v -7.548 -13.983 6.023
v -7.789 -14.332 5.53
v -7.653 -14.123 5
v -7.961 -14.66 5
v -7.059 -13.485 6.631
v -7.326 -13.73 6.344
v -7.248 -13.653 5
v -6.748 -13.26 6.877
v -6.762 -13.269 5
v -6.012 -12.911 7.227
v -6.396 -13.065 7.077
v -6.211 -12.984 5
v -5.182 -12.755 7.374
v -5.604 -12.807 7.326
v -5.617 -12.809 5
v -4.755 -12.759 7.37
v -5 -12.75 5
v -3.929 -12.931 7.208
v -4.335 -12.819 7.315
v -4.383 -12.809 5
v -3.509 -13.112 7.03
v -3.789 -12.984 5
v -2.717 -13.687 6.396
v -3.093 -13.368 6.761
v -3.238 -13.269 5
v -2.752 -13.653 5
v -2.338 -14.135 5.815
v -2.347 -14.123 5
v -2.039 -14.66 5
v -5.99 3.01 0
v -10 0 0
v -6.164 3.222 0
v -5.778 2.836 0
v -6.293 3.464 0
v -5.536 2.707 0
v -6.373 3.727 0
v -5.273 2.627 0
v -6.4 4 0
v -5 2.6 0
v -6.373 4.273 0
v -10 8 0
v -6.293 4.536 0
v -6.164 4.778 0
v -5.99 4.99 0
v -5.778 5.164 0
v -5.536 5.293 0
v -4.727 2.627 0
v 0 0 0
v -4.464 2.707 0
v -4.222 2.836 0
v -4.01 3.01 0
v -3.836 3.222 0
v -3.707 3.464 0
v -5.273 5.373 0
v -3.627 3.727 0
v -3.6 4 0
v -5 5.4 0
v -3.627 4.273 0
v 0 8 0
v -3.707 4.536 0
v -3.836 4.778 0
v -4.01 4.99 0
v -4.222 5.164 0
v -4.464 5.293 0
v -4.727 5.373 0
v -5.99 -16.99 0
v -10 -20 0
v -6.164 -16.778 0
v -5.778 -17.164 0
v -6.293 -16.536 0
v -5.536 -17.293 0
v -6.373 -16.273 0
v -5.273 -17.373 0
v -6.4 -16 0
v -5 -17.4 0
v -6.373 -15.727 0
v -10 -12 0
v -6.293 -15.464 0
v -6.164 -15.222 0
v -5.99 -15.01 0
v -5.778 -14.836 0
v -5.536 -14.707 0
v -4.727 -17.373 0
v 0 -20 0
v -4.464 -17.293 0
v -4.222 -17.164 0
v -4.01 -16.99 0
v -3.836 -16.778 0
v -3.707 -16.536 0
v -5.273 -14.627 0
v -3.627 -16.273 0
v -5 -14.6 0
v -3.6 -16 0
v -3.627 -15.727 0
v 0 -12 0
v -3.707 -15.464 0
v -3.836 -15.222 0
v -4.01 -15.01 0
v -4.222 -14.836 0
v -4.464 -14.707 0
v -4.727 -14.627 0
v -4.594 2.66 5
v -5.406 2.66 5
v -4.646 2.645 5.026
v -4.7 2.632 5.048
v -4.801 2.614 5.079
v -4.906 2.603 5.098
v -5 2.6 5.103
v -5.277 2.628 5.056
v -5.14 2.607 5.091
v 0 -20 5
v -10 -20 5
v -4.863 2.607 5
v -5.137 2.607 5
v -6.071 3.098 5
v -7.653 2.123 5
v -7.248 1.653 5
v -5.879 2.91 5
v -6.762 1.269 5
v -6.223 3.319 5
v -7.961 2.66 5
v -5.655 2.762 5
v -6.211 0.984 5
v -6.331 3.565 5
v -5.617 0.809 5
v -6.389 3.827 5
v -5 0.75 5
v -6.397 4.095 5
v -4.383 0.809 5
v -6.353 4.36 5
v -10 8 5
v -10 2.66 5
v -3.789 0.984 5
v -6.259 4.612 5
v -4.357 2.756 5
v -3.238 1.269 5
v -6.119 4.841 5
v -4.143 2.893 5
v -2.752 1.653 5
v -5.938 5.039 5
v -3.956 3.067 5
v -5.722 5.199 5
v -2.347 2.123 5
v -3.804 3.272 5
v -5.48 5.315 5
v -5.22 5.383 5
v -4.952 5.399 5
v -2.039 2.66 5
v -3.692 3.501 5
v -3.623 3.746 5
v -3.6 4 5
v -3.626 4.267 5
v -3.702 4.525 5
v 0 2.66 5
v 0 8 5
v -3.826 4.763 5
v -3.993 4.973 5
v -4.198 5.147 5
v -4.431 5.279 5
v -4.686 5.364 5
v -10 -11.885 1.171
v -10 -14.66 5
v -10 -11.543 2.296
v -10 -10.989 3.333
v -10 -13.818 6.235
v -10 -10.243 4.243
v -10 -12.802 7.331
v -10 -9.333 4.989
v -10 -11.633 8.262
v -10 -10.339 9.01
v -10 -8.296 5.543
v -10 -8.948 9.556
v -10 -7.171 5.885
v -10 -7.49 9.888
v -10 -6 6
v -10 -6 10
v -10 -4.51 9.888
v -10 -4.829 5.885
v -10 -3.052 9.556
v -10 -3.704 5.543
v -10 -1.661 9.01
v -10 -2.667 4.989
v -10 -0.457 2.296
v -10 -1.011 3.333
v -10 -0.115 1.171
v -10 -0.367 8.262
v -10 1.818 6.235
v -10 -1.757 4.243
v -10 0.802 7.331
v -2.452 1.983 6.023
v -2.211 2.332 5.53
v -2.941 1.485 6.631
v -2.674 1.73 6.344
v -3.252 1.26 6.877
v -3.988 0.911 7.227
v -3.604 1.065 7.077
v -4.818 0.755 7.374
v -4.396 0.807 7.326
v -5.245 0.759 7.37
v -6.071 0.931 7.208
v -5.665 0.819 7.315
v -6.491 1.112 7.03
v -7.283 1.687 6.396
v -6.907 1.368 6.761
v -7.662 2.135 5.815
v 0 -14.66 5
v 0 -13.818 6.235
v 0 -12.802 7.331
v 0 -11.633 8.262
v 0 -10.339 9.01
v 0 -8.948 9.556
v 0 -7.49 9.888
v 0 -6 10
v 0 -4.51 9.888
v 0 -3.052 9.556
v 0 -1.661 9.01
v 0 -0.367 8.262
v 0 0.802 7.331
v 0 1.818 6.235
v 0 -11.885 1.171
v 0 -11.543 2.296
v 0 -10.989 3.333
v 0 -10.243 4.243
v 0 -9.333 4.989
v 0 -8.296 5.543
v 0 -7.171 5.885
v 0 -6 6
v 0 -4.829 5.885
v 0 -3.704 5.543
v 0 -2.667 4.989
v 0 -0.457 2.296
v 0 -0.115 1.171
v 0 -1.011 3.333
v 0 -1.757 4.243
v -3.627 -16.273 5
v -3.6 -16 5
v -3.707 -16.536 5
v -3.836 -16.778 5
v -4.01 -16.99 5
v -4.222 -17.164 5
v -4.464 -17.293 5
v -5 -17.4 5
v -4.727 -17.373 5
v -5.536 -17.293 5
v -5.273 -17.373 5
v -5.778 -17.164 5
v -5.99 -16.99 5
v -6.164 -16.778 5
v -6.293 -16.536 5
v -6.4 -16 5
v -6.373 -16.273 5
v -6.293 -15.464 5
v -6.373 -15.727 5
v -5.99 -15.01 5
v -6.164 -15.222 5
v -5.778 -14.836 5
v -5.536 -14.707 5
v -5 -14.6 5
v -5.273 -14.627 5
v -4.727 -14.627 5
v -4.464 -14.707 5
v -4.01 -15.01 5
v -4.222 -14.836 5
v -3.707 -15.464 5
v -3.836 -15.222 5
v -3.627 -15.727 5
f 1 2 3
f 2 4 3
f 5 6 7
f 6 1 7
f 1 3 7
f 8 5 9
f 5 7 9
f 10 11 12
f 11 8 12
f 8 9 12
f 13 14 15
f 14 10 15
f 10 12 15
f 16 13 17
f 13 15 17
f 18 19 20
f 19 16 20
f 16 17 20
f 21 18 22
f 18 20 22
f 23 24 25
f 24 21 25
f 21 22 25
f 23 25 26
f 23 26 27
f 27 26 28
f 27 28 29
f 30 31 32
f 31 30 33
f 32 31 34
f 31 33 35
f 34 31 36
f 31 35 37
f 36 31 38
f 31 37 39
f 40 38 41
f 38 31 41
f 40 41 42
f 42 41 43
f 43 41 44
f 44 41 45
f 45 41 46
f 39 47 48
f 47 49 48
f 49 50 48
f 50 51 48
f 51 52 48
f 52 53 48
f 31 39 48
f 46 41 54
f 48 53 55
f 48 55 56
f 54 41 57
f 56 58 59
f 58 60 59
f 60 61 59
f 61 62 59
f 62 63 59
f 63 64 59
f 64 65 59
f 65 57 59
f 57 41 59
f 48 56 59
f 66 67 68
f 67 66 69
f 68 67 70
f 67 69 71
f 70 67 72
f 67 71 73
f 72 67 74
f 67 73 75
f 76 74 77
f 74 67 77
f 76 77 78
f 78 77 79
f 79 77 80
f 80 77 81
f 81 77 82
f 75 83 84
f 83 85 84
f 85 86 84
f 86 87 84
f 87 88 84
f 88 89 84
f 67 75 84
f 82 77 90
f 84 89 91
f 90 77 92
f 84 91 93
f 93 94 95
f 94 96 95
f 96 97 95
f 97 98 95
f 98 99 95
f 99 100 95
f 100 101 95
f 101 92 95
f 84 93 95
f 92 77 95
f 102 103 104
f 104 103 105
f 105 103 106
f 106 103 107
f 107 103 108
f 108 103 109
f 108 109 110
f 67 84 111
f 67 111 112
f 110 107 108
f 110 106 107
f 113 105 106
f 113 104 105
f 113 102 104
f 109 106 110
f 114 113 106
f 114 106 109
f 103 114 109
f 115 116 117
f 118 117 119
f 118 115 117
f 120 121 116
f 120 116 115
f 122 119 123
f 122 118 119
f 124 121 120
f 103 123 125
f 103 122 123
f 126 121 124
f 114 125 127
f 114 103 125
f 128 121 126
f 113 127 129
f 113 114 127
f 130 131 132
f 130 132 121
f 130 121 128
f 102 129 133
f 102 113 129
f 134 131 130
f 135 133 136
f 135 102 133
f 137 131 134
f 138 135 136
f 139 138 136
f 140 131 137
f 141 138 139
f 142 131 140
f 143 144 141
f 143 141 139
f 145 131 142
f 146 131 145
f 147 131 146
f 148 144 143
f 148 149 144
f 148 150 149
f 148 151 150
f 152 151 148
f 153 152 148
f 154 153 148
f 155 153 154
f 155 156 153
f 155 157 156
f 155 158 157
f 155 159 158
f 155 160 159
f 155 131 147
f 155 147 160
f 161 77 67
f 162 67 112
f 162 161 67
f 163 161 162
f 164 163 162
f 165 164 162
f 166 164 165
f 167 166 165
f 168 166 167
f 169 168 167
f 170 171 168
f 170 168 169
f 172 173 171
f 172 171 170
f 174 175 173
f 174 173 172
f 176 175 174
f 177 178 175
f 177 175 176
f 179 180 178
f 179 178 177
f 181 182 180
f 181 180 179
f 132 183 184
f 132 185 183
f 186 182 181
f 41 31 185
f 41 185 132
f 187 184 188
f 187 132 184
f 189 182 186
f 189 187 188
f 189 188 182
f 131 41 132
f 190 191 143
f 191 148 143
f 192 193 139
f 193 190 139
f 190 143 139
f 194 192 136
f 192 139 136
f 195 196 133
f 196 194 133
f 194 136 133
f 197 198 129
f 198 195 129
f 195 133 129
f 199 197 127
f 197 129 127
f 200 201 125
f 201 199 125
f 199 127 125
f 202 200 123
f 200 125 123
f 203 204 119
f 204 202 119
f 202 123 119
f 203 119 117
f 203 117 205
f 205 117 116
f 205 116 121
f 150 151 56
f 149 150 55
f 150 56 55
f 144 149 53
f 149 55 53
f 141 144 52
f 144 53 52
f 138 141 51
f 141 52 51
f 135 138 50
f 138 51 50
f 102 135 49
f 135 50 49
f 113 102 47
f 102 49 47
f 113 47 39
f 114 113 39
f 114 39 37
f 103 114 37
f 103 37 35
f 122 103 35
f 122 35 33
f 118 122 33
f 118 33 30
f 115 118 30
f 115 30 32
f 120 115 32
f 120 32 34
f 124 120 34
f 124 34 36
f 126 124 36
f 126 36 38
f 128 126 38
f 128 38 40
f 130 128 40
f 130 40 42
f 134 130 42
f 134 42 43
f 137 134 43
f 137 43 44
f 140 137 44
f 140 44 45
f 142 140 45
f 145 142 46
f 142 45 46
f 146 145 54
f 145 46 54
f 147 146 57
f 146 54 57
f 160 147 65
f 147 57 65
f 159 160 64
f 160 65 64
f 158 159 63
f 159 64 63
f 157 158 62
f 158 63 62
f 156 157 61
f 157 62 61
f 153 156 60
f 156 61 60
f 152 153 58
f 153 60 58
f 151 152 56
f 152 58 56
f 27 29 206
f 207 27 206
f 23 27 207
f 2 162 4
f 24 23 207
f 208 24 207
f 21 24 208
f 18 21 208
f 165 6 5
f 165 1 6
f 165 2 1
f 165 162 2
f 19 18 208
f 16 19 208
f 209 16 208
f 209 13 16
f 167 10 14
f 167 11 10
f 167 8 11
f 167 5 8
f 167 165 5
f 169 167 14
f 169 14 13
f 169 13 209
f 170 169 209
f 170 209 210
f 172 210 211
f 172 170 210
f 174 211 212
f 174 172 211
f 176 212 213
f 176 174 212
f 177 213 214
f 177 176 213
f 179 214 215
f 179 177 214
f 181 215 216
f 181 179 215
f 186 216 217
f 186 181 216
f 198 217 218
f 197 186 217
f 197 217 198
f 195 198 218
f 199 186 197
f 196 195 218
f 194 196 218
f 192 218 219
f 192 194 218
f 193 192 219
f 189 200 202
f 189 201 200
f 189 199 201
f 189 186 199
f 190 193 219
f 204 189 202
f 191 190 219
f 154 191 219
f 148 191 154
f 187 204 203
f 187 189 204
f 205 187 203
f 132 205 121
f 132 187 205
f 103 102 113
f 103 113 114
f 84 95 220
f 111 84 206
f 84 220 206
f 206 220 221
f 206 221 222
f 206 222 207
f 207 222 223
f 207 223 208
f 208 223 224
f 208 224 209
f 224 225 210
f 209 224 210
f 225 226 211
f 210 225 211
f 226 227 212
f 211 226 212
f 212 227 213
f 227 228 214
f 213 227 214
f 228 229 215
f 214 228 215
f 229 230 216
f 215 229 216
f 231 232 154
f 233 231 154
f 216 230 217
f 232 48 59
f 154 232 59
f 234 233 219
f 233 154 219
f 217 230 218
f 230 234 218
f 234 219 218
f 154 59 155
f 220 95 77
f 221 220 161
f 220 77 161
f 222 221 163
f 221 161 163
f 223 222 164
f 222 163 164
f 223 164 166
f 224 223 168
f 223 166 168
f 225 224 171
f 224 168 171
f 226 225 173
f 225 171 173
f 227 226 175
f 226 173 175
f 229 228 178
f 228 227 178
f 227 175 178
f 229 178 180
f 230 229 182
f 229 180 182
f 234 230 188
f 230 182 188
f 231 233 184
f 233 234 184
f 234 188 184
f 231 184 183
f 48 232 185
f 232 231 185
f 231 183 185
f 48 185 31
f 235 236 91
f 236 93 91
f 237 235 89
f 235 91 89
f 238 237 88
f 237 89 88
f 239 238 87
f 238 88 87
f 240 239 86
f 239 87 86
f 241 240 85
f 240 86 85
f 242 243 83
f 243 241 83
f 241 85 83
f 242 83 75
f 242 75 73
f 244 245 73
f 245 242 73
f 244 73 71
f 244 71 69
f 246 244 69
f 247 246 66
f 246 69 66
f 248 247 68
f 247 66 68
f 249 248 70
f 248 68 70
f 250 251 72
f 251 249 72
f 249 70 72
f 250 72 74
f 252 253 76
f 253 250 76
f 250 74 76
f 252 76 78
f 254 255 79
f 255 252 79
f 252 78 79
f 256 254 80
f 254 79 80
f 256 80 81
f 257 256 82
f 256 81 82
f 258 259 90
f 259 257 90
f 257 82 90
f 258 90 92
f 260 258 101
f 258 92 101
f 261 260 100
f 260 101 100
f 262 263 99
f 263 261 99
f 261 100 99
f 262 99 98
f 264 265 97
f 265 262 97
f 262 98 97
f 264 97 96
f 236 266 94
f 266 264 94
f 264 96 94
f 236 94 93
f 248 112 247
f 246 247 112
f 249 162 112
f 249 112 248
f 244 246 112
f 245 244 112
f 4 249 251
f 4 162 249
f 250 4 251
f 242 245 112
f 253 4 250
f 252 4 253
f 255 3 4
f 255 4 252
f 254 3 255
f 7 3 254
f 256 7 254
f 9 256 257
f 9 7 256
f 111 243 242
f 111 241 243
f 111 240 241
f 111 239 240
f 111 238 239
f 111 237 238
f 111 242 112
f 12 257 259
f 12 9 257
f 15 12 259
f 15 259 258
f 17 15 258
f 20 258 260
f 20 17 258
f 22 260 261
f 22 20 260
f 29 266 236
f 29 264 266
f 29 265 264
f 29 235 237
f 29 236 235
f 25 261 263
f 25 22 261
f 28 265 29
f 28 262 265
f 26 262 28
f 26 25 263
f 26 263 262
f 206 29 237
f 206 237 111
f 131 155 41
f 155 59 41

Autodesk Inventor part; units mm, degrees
ref_plane "YZ Plane" through (0, 0, 0) normal (1, 0, 0) x (0, 1, 0)
ref_plane "XZ Plane" through (0, 0, 0) normal (0, 1, 0) x (-1, 0, 0)
ref_plane "XY Plane" through (0, 0, 0) normal (0, 0, 1) x (1, 0, 0)
sketch "Sketch1" plane through (0, 0, 0) normal (0, 0, 1) x (1, 0, 0)
  circle A0 centre (-5, -16) radius 1.4 projected
  line L0 (0, -20) -> (0, -12) projected
  line L1 (0, -12) -> (-10, -12) projected
  line L2 (-10, -20) -> (-10, -12) projected
  line L3 (0, -20) -> (-10, -20) projected
  circle A1 centre (-5, 4) radius 1.4 projected
  line L4 (0, 0) -> (0, 8) projected
  line L5 (0, 8) -> (-10, 8) projected
  line L6 (-10, 0) -> (-10, 8) projected
  line L7 (0, 0) -> (-10, 0) projected
extrude "Extrusion1" add sketch "Sketch1" along normal blind 5
sketch "Sketch2" plane through (-10, -20, 0) normal (-1, 0, 0) x (0, 0, 1)
  line L0 (0, 8) -> (0, 0) projected
  line L1 (0, 0) -> (5, 0) projected
  line L2 (5, 8) -> (5, 0) projected
  line L3 (0, 8) -> (5, 8) projected
  line L4 (0, 28) -> (0, 20) projected
  line L5 (0, 20) -> (5, 20) projected
  line L6 (5, 28) -> (5, 20) projected
  line L7 (0, 28) -> (5, 28) projected
  circle A0 centre (0, 14) radius 6 projected
  circle A1 centre (0, 14) radius 10
  point P0 (5, 22.6603)
  point P1 (5, 5.3397)
  dimension "d2" = 4
extrude "Extrusion2" add sketch "Sketch2" against normal up to surface (10 mm away) contours A0 L5 L6 A1 L2 L3
sketch "Sketch3" plane through (0, 0, 5) normal (0, 0, 1) x (1, 0, 0)
  line L0 (-5.4063, -14.6603) -> (-10, -14.6603) projected
  line L1 (-10, -14.6603) -> (-10, -20) projected
  line L2 (-10, -20) -> (0, -20) projected
  line L3 (0, -20) -> (0, -14.6603) projected
  line L4 (0, -14.6603) -> (-4.5937, -14.6603) projected
  arc A0 (-5.4063, -14.6603) -> (-4.5937, -14.6603) centre (-5, -16) ccw projected
  line L5 (-10, 2.6603) -> (-5.4063, 2.6603) projected
  arc A1 (-4.5937, 2.6603) -> (-5.4063, 2.6603) centre (-5, 4) ccw projected
  line L6 (-4.5937, 2.6603) -> (0, 2.6603) projected
  line L7 (0, 2.6603) -> (0, 8) projected
  line L8 (0, 8) -> (-10, 8) projected
  line L9 (-10, 8) -> (-10, 2.6603) projected
  circle A2 centre (-5, -16) radius 3.25
  circle A3 centre (-5, 4) radius 1.4 projected
  circle A4 centre (-5, 4) radius 3.25
  point P0 (0, 0)
  point P1 (-7.961, 2.6603)
  point P2 (-2.039, 2.6603)
  point P3 (-2.039, -14.6603)
  point P4 (-7.961, -14.6603)
  dimension "d5" = 6.5
extrude "Extrusion3" cut sketch "Sketch3" along normal blind 10 contours L0 A2 L4 A0 | L5 A3 L6 A4 picked at (-4.8549, -16.4084)
properties part number "Z Axis Top Brace Clamp" material "ABS Plastic"
